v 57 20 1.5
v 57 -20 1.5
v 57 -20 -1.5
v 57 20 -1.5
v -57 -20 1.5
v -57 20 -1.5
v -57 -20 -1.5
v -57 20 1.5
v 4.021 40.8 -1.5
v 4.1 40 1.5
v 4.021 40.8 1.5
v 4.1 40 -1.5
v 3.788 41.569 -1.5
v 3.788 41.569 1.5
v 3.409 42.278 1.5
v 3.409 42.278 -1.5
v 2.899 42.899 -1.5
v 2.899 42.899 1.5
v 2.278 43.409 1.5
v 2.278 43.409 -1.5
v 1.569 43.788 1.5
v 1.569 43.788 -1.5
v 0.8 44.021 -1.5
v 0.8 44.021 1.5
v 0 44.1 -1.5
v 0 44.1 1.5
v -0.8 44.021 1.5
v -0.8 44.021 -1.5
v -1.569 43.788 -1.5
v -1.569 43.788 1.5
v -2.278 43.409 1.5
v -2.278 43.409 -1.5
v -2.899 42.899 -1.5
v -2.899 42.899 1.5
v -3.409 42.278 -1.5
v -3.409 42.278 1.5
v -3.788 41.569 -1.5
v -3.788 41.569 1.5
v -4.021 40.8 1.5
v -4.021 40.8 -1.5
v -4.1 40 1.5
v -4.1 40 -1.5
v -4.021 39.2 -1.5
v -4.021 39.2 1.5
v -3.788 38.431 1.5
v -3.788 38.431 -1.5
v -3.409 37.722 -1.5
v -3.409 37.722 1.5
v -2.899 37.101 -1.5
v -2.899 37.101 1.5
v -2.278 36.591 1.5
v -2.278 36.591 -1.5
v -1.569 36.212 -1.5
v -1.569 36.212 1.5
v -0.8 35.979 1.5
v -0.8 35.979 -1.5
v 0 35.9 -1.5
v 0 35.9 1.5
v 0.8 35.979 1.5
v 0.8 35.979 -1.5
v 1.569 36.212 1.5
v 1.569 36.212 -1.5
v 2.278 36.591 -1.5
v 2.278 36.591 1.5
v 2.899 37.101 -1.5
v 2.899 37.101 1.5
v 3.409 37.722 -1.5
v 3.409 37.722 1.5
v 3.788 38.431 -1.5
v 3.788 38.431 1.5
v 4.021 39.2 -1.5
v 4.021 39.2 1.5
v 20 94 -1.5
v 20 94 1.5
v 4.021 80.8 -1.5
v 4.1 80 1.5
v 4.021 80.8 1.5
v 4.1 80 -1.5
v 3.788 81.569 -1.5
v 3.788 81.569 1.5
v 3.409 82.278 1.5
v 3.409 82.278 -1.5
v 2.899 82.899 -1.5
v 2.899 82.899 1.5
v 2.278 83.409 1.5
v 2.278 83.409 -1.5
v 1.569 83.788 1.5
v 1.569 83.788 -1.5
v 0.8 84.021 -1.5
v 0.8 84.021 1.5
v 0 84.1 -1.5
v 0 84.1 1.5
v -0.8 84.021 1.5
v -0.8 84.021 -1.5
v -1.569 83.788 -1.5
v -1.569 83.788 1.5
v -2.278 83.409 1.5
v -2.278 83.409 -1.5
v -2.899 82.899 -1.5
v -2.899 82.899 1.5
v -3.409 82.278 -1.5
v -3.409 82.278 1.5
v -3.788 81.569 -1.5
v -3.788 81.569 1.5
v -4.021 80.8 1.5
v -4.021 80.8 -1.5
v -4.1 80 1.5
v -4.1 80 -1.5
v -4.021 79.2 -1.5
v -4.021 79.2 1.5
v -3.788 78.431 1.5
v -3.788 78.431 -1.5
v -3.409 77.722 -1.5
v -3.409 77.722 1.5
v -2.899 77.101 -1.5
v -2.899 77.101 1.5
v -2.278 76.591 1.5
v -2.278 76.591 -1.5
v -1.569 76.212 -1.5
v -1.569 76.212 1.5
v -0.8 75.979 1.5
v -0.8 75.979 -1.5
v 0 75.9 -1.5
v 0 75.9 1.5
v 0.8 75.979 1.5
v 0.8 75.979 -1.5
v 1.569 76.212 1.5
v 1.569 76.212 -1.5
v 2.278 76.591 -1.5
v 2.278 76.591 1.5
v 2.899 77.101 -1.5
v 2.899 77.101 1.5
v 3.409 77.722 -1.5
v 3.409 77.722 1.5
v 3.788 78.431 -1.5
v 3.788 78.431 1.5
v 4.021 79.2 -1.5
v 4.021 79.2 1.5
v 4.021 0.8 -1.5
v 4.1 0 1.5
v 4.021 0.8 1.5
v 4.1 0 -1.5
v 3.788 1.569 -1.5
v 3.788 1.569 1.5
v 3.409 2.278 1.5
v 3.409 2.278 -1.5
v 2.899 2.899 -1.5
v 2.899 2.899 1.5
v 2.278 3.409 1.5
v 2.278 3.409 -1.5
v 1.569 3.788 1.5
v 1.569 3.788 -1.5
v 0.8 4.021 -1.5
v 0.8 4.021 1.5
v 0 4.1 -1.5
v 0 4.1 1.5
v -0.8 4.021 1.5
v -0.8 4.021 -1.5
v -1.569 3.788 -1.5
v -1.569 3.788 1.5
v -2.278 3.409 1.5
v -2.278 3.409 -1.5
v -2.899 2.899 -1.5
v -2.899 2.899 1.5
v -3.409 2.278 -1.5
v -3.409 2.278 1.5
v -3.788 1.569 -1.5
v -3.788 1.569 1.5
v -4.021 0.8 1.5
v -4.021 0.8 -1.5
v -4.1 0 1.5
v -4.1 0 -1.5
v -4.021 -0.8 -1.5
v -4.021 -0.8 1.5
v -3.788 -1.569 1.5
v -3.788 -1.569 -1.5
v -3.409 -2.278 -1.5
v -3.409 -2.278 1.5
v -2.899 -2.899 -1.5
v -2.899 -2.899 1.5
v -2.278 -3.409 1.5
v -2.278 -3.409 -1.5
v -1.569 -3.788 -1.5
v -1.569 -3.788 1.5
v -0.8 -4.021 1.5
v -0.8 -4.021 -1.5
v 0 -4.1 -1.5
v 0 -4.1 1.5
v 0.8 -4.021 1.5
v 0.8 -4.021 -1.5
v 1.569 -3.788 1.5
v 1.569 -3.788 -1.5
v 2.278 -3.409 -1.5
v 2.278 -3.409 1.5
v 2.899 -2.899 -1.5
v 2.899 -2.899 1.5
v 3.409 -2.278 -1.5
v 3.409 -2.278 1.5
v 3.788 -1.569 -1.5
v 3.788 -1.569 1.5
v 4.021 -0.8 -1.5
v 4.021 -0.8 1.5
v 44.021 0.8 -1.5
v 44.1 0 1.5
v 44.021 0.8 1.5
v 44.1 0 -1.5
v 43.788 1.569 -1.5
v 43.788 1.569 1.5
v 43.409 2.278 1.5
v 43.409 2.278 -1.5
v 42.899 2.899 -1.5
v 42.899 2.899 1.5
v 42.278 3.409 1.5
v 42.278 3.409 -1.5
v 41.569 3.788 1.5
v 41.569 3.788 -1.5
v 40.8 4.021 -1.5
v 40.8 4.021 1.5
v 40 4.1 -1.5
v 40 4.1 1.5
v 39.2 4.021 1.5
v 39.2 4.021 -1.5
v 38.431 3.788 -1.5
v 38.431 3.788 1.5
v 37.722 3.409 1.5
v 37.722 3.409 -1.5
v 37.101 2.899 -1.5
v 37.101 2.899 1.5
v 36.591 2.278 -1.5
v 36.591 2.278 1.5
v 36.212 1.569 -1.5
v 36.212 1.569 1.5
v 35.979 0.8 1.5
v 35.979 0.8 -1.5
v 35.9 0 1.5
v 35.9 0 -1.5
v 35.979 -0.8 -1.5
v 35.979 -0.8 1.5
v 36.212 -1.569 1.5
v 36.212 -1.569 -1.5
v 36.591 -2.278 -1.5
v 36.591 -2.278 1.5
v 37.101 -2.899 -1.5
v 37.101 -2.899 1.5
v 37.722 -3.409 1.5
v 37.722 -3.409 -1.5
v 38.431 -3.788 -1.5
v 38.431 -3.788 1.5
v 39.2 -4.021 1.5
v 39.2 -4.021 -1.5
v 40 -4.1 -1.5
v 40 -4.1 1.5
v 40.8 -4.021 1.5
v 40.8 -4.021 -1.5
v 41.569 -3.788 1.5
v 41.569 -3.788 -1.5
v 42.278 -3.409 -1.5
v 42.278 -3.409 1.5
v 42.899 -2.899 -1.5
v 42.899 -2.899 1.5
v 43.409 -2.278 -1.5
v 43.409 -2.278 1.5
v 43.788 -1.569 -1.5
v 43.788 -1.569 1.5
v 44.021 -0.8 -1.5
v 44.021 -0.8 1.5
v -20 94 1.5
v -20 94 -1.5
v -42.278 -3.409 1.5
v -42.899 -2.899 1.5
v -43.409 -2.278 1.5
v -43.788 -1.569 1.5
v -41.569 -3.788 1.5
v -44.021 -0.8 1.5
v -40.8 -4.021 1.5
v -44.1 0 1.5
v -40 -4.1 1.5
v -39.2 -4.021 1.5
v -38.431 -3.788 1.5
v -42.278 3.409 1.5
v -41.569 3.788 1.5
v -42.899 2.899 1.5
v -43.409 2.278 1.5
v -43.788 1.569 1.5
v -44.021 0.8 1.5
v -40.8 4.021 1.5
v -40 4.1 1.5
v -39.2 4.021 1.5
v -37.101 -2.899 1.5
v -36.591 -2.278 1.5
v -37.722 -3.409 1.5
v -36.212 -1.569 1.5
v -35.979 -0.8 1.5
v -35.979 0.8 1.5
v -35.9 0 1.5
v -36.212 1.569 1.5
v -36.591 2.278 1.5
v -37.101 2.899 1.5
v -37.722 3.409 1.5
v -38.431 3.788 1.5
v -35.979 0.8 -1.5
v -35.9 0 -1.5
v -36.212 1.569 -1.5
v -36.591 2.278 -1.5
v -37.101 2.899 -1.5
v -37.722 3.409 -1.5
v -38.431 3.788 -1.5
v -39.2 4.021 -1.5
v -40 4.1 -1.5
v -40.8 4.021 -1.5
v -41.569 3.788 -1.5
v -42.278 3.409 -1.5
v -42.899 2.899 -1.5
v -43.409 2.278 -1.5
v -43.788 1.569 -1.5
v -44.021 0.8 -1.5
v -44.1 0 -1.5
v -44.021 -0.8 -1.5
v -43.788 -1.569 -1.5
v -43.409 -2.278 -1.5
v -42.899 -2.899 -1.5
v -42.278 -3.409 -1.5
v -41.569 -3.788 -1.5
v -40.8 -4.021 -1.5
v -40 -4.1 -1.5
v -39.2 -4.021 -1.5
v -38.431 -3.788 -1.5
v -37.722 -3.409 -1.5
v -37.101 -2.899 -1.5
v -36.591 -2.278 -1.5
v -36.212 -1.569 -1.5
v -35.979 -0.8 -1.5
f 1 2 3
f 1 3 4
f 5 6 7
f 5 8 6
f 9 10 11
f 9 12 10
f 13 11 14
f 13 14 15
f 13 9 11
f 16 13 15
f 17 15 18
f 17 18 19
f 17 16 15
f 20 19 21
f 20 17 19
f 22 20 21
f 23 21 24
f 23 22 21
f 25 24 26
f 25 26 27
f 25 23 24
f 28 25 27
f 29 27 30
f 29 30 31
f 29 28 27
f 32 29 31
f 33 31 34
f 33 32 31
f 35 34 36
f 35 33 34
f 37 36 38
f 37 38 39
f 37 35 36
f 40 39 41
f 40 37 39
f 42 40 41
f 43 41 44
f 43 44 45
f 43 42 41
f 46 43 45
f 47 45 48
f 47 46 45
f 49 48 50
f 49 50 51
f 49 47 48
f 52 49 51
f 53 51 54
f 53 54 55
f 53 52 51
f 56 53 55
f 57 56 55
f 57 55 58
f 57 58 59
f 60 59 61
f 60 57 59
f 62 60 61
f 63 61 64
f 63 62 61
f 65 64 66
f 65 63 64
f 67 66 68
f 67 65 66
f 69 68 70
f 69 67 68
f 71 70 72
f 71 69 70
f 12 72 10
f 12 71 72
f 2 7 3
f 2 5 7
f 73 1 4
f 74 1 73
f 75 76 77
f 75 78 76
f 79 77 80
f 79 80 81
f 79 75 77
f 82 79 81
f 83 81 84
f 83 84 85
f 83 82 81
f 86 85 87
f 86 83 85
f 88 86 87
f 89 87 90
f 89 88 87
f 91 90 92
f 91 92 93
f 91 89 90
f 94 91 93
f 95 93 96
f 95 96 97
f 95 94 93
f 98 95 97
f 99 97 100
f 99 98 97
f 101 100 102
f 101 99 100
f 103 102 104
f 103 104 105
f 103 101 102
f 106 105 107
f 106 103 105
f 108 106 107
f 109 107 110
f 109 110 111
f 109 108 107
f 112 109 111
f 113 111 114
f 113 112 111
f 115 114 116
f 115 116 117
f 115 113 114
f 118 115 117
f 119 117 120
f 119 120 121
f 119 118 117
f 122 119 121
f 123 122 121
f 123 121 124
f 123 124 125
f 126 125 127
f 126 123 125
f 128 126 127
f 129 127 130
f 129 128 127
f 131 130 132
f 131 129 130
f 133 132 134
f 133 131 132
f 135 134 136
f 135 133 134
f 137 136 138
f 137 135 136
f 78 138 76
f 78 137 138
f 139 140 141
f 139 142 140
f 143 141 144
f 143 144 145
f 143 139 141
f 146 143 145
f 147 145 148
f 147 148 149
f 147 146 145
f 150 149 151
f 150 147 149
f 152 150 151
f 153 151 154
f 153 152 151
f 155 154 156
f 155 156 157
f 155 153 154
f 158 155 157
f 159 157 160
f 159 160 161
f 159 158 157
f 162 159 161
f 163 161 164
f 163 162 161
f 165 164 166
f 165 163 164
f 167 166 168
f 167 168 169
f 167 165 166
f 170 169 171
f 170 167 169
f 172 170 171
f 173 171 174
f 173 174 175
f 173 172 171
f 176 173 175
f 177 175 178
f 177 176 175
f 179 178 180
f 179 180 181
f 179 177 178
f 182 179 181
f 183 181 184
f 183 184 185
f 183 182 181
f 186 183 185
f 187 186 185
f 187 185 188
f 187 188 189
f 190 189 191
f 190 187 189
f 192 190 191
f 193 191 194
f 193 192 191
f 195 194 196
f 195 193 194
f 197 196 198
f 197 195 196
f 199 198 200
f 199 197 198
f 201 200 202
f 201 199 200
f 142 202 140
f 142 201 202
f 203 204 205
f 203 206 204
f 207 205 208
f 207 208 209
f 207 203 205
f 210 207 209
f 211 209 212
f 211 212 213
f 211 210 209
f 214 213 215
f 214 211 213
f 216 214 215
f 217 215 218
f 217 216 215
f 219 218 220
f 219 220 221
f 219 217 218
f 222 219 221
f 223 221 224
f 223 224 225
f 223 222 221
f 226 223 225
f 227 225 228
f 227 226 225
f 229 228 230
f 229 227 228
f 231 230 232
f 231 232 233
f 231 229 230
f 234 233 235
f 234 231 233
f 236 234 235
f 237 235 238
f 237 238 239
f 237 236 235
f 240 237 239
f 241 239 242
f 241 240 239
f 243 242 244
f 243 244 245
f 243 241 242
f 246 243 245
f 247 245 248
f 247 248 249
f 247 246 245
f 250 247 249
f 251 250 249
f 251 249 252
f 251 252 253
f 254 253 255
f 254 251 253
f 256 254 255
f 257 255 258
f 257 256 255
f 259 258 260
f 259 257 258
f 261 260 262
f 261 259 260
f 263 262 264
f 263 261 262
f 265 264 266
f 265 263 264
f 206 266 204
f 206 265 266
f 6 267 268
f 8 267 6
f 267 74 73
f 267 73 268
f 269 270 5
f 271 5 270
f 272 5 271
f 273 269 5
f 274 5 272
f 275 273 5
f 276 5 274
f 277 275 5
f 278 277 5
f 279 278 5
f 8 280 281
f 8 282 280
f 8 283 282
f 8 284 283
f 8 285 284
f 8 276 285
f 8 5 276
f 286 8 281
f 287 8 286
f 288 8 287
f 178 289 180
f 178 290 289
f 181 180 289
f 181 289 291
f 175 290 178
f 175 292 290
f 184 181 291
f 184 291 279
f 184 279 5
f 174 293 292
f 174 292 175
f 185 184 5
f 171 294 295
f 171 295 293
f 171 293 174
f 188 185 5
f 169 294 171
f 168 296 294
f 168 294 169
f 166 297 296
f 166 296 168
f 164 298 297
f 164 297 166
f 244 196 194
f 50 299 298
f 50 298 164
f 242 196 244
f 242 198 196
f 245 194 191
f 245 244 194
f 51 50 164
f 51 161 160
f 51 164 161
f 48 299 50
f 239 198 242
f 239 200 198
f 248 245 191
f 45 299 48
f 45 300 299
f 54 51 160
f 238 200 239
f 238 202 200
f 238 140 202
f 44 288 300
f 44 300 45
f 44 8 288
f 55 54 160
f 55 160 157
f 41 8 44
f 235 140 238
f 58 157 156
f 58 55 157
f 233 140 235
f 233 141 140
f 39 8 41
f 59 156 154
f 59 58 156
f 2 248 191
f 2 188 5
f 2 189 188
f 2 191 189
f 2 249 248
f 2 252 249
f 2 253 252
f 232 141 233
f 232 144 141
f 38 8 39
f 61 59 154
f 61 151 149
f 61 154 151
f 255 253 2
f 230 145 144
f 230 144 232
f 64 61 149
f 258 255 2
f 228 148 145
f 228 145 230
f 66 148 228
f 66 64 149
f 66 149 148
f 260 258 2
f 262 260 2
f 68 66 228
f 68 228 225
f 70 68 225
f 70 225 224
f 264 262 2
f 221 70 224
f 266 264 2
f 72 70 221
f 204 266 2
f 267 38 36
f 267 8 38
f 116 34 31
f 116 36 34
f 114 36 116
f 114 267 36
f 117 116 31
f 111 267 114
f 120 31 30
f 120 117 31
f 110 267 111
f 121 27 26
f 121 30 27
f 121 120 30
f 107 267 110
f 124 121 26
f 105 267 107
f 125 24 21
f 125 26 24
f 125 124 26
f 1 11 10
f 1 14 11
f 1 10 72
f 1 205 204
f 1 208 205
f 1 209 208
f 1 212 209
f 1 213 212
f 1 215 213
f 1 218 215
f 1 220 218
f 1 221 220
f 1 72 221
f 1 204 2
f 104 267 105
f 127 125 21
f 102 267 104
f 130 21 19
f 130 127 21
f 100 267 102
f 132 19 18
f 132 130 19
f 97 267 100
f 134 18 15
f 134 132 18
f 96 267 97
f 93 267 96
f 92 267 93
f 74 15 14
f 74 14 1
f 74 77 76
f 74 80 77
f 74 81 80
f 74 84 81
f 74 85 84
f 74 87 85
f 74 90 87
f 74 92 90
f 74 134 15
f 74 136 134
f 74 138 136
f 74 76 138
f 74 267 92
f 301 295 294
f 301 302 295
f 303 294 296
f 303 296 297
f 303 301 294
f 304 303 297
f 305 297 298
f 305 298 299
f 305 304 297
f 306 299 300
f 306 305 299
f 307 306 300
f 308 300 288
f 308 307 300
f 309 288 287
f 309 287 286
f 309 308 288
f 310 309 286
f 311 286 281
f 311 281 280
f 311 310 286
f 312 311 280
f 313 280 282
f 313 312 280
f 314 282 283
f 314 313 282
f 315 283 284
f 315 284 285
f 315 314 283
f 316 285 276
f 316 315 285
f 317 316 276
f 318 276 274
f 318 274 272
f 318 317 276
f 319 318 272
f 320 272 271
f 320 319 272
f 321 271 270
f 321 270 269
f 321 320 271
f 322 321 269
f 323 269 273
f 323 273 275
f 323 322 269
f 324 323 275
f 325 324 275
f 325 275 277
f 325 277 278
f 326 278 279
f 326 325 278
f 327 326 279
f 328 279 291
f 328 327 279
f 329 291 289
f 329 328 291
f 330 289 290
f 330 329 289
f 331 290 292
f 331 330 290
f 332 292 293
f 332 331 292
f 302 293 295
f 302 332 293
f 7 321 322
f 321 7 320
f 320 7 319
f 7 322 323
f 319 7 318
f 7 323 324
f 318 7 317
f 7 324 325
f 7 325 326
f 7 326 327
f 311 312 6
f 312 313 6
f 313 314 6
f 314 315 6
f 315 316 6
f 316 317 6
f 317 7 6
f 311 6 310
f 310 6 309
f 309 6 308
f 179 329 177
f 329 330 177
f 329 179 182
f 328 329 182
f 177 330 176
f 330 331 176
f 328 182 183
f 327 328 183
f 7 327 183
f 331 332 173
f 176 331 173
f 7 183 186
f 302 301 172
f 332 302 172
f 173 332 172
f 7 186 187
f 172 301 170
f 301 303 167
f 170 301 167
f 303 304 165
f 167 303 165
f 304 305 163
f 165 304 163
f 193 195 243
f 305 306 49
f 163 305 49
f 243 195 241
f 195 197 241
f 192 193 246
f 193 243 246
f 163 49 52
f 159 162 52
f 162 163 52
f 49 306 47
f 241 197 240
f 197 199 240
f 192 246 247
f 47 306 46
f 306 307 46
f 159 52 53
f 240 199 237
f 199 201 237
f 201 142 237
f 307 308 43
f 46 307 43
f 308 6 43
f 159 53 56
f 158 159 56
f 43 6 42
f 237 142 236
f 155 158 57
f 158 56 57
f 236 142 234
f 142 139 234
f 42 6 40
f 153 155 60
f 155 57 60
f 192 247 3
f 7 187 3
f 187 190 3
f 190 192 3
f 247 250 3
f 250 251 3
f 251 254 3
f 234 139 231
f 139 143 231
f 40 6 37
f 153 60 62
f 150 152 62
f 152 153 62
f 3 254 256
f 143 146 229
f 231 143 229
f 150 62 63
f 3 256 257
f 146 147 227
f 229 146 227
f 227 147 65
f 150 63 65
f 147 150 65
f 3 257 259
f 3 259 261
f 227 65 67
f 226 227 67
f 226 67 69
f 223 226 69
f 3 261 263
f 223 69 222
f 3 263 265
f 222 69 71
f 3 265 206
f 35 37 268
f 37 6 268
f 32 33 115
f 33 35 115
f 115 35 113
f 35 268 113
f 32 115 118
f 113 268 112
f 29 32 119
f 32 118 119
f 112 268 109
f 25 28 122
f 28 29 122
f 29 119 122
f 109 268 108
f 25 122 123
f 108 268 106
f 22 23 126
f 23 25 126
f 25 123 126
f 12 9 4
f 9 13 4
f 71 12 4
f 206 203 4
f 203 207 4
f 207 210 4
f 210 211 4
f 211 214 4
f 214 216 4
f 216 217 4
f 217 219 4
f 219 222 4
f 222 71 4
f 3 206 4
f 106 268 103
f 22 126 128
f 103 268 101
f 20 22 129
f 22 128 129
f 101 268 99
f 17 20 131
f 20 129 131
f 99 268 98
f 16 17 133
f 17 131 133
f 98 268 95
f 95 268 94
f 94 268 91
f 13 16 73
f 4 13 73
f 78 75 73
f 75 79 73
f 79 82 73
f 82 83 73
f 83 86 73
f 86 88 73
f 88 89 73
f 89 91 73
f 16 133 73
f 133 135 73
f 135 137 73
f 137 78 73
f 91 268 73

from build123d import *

# Parameters (mm, degrees)
SKETCH_1_R        = 4.1
EXTRUDE_405_DEPTH = 1.5


with BuildPart() as part:
    # Эскиз1 → Extrude 405 (new, symmetric)
    with BuildSketch(Plane.XY):
        Polygon((-57, -20), (57, -20), (57, 20), (20, 94), (-20, 94), (-57, 20), align=None)
        Circle(SKETCH_1_R, mode=Mode.SUBTRACT)
        with Locations((-40, 0)):
            Circle(SKETCH_1_R, mode=Mode.SUBTRACT)
        with Locations((40, 0)):
            Circle(SKETCH_1_R, mode=Mode.SUBTRACT)
        with Locations((0, 40)):
            Circle(SKETCH_1_R, mode=Mode.SUBTRACT)
        with Locations((0, 80)):
            Circle(SKETCH_1_R, mode=Mode.SUBTRACT)
    extrude(amount=EXTRUDE_405_DEPTH, both=True)


solid = part.part
